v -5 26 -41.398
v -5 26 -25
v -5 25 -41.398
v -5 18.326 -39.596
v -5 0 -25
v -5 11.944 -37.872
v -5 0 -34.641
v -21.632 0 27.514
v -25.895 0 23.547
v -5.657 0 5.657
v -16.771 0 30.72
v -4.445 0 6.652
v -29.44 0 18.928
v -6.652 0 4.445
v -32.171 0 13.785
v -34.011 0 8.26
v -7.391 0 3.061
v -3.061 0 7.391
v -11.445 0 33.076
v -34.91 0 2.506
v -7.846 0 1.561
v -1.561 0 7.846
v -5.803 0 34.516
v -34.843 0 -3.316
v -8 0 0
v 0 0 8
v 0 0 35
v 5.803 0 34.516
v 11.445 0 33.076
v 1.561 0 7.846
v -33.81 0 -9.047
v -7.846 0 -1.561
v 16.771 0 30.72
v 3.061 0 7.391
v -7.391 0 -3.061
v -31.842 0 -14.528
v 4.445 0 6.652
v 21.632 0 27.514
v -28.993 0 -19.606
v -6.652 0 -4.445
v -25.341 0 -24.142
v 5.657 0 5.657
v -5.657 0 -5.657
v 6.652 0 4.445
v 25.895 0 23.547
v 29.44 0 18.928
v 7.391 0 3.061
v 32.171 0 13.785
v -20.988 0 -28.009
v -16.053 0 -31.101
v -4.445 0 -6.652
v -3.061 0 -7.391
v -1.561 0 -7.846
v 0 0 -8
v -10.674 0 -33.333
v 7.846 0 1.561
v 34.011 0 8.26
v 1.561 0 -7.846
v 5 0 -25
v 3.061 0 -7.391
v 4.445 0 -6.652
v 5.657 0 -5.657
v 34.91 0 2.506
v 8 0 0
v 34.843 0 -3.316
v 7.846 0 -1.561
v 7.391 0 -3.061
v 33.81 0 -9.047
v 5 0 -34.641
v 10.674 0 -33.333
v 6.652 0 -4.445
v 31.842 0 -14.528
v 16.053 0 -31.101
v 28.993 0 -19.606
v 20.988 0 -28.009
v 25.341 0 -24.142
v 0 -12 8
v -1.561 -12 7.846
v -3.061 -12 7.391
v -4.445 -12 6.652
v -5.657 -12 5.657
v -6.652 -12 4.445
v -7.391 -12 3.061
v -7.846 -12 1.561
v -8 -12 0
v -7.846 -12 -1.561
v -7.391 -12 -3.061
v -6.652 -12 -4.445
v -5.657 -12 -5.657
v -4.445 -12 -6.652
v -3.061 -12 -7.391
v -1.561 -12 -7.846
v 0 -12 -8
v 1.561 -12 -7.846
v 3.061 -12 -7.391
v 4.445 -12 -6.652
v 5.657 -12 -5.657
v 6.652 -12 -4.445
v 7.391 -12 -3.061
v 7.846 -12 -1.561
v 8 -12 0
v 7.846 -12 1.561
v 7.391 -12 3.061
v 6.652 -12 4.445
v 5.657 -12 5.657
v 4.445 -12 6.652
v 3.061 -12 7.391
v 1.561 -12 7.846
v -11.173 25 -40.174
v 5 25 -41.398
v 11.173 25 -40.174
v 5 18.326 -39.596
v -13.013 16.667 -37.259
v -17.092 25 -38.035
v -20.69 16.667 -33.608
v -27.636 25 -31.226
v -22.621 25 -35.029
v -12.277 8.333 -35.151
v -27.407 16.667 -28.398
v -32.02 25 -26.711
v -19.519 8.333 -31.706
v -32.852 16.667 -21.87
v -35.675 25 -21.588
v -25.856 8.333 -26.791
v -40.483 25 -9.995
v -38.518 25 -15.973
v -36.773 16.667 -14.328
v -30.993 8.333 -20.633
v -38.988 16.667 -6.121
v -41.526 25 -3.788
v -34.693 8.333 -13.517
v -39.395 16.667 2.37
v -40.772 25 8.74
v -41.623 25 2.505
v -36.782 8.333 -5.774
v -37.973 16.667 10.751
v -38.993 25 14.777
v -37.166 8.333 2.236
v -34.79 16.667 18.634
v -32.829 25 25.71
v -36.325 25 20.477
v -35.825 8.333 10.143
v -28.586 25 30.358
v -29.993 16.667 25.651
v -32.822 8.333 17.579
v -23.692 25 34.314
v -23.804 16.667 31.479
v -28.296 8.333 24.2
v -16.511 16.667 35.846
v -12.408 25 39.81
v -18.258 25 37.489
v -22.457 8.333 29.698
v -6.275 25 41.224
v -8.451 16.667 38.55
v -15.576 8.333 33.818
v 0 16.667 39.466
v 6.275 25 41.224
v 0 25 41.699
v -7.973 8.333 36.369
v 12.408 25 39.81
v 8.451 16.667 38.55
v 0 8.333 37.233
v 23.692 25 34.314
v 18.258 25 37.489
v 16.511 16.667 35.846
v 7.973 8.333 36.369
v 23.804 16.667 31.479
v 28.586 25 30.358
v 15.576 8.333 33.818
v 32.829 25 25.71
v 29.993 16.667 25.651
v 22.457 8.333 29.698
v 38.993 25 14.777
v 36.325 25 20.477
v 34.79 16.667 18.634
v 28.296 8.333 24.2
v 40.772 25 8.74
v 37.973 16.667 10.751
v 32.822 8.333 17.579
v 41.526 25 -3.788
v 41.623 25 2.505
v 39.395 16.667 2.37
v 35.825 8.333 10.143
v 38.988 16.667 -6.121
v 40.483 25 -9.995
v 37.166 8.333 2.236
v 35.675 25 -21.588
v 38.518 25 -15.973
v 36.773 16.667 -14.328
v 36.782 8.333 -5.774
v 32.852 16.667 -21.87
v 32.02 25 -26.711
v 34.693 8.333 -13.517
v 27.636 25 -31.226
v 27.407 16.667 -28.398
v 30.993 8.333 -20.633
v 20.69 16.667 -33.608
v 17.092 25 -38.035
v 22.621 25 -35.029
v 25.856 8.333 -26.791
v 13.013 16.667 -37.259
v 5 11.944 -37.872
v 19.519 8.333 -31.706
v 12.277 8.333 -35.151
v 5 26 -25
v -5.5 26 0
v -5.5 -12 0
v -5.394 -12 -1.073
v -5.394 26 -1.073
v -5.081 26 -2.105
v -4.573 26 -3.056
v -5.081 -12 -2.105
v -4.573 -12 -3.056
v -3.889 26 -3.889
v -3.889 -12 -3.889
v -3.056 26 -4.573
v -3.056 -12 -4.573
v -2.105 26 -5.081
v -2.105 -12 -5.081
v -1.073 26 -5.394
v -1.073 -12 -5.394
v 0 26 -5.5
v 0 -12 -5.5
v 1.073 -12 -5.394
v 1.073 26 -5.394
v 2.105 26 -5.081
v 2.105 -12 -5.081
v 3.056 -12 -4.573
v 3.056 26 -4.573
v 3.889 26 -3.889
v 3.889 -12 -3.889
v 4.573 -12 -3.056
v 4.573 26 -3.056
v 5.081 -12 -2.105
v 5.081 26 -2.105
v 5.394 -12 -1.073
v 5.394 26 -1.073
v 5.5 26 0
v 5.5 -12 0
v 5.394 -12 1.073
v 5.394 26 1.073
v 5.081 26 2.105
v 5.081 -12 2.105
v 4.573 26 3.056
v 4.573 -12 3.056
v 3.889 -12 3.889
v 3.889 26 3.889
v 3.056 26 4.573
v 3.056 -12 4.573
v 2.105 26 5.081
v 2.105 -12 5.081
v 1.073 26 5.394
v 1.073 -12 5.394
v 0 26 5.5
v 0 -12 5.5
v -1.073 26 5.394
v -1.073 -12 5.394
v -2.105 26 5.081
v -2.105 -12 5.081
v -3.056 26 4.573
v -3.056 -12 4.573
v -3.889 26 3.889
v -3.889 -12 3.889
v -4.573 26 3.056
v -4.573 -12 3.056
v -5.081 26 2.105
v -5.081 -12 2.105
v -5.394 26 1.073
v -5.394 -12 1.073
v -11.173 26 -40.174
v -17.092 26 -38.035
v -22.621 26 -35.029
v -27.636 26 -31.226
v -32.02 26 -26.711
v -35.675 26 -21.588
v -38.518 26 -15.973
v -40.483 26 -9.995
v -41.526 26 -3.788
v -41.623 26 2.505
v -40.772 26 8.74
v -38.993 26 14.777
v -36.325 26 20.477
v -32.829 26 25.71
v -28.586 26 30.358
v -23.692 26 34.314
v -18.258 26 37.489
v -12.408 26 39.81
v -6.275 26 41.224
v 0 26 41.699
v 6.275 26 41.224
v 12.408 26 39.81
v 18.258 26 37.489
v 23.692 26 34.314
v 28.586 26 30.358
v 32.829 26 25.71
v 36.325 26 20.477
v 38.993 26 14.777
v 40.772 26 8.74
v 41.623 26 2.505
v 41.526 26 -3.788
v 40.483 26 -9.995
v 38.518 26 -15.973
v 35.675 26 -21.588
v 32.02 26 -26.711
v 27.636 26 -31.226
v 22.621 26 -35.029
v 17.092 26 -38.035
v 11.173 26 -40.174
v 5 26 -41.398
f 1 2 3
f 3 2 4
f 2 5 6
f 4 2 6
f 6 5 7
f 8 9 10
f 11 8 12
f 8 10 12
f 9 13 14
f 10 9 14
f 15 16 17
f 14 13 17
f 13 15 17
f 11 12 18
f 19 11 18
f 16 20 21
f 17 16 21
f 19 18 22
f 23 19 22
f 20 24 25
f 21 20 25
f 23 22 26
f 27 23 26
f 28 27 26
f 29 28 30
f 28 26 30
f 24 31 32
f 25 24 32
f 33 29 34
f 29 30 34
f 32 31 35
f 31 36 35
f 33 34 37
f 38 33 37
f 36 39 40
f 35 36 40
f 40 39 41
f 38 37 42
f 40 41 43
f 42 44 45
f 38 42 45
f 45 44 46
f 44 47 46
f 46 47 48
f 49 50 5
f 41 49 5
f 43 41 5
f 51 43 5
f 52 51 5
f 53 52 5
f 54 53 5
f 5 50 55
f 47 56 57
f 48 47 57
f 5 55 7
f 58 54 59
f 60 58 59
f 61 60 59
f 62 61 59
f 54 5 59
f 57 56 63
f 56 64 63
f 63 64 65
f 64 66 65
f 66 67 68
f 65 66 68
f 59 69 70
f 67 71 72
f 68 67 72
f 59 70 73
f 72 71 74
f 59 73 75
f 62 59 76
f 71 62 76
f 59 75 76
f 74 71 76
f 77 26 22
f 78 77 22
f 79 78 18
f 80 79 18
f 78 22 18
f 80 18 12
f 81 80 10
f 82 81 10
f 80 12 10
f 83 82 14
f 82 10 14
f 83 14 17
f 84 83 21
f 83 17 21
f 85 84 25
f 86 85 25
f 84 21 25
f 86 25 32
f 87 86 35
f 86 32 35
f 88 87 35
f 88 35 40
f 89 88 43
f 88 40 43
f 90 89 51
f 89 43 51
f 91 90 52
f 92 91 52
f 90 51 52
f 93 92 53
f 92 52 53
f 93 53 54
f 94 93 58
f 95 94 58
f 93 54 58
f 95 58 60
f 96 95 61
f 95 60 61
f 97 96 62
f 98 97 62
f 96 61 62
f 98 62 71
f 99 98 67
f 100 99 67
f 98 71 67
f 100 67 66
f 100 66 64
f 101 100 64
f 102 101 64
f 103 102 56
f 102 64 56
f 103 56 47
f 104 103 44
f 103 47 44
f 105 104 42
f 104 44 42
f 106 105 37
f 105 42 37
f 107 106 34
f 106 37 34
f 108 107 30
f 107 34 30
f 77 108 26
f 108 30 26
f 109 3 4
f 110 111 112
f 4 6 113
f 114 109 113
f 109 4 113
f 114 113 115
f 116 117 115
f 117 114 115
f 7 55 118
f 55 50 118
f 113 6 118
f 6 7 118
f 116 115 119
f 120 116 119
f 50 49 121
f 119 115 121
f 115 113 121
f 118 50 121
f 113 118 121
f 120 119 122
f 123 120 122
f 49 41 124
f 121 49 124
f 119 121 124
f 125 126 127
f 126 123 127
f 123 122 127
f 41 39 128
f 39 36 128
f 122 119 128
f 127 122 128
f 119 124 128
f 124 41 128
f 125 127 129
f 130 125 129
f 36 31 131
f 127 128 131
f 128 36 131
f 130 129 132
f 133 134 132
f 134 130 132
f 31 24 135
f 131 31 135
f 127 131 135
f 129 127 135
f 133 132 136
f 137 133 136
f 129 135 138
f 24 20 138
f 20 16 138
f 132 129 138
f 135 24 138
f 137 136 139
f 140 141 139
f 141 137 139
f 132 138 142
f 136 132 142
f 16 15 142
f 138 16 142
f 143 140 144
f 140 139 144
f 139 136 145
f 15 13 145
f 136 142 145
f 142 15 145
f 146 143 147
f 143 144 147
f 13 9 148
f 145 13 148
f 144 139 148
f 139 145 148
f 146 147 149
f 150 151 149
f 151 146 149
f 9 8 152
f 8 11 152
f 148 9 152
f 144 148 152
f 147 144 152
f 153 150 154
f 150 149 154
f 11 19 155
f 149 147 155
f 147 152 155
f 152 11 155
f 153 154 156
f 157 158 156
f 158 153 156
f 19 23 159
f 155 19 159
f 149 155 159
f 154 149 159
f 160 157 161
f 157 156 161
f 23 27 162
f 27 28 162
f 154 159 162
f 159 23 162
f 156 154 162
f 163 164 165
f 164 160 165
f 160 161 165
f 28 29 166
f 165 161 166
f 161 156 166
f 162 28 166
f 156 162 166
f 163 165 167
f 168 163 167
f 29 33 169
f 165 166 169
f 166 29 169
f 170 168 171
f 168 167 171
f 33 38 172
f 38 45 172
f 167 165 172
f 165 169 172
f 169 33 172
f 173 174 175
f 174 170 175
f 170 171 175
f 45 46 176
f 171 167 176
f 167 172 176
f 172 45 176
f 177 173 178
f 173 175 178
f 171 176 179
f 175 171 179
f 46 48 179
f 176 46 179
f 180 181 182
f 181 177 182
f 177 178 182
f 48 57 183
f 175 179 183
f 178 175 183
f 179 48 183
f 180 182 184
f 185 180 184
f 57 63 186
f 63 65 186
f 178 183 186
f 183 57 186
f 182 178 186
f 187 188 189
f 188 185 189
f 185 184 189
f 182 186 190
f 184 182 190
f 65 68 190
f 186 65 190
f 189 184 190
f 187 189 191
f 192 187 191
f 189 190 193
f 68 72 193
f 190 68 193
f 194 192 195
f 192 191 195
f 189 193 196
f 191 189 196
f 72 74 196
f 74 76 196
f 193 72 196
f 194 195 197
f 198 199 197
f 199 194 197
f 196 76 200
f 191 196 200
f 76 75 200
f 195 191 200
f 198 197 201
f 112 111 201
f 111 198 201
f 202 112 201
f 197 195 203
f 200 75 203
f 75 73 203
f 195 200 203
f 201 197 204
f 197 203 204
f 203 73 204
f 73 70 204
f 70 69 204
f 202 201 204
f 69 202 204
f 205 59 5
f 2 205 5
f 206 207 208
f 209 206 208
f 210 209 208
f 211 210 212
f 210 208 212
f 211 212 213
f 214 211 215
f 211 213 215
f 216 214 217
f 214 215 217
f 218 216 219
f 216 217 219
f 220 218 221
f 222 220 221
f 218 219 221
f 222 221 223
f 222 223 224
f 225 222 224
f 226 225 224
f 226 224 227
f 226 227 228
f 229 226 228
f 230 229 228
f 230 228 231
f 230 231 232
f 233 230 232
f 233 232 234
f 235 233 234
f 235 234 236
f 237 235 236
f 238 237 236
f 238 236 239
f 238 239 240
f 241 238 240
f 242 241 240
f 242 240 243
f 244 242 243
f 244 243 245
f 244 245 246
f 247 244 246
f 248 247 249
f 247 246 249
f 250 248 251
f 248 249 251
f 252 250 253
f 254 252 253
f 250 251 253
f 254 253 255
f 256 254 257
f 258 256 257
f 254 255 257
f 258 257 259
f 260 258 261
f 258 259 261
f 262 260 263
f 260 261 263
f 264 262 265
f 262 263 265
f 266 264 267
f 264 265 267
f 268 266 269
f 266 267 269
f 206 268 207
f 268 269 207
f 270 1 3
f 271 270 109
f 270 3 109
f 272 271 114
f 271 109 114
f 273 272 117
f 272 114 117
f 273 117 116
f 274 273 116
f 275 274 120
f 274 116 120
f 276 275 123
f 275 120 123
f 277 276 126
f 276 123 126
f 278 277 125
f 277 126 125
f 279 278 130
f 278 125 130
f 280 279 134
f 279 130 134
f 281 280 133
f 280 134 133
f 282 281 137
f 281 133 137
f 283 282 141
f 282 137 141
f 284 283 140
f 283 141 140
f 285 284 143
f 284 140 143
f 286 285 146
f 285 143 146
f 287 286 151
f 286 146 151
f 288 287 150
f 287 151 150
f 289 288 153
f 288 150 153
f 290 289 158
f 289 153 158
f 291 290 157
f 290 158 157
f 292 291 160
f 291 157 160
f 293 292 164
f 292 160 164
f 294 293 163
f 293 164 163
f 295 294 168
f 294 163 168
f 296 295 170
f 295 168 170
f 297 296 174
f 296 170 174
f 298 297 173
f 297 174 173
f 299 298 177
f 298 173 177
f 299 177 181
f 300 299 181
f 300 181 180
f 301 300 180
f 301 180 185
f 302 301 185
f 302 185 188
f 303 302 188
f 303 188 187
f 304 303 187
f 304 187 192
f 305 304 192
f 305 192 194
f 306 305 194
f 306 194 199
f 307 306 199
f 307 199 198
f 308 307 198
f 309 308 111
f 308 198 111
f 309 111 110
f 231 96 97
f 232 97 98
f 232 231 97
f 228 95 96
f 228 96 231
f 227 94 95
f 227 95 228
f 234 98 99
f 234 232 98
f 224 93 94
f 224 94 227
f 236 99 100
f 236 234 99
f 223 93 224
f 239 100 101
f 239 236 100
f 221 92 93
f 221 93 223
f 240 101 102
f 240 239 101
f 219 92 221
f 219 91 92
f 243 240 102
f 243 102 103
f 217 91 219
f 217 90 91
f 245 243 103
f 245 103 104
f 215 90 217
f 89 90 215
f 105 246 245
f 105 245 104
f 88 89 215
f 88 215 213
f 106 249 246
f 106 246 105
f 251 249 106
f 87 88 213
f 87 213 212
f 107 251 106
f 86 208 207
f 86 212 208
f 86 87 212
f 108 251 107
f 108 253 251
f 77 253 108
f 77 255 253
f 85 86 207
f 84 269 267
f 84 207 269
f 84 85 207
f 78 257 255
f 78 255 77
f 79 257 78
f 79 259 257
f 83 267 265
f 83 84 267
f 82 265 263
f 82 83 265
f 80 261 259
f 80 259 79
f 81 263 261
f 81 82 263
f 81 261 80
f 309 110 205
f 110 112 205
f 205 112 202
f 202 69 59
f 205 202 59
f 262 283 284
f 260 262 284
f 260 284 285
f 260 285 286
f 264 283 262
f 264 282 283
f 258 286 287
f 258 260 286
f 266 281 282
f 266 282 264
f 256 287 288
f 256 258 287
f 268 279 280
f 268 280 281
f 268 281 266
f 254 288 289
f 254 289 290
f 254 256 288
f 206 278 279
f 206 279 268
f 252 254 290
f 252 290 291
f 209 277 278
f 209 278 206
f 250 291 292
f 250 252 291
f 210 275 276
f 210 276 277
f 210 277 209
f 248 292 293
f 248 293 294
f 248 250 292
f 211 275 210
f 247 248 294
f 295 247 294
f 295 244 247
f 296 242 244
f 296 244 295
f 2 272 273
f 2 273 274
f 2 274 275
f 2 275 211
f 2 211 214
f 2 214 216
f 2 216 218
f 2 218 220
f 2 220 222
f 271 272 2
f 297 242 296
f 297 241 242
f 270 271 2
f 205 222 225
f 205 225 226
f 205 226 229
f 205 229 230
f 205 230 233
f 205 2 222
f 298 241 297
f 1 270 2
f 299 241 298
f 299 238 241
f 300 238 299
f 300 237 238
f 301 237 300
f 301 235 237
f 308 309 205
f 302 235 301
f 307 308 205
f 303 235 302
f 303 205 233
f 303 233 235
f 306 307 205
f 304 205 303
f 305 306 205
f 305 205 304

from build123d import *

# Parameters (mm, degrees)
SKETCH1_R                  = 35
EXTRUDE1_DEPTH             = 25
EXTRUDE1_DRAFT             = -15
SKETCH2_R                  = 8
EXTRUDE2_DEPTH             = 12
SKETCH3_W                  = 10
SKETCH3_H                  = 30
CUT_EXTRUDE1_DEPTH         = 70.617297676
EXTRUDE4_DEPTH             = 1
F_11_0_11_DIAMETER_HOLE1_D = 11


with BuildPart() as part:
    # Sketch1 → Extrude1 (with draft: the straight prism first)
    with BuildSketch(Plane(origin=(0, 0, 0), x_dir=(1, 0, 0), z_dir=(0, 1, 0))):
        Circle(SKETCH1_R)
    extrude(amount=EXTRUDE1_DEPTH)
    # Extrude1: the draft: its side faces are tilted about the plane it starts from
    extrude1_sides = [part.faces().sort_by_distance(p)[0] for p in [
        (-35, 12.5, 0),
    ]]
    draft(extrude1_sides, Plane(origin=(0, 0, 0), x_dir=(1, 0, 0), z_dir=(0, 1, 0)), EXTRUDE1_DRAFT)

    # Sketch2 → Extrude2 (add)
    with BuildSketch(Plane.XZ):
        with Locations(Location((0, 0, 0), (0, 0, 90))):
            Circle(SKETCH2_R)
    extrude(amount=EXTRUDE2_DEPTH)

    # Sketch3 → Cut-Extrude1 (cut, through all)
    with BuildSketch(Plane(origin=(0, 25, 0), x_dir=(1, 0, 0), z_dir=(0, 1, 0))):
        with Locations((0, 40)):
            Rectangle(SKETCH3_W, SKETCH3_H)
    extrude(amount=-CUT_EXTRUDE1_DEPTH, mode=Mode.SUBTRACT)

    # Sketch5 → Extrude4 (add)
    with BuildSketch(Plane(origin=(0, 25, 0), x_dir=(1, 0, 0), z_dir=(0, 1, 0))):
        with BuildLine():
            Line((-5, 25), (-5, 41.397875161))
            ThreePointArc((-5, 41.397875161), (0, -41.698729811), (5, 41.397875161))
            Line((5, 41.397875161), (5, 25))
            Line((5, 25), (-5, 25))
        make_face()
    extrude(amount=EXTRUDE4_DEPTH)

    # Ø11.0 (11) Diameter Hole1 (through all)
    with Locations(Plane(origin=(0, 26, 0), x_dir=(1, 0, 0), z_dir=(0, 1, 0))):
        with Locations((0, 0)):
            Hole(F_11_0_11_DIAMETER_HOLE1_D / 2)


solid = part.part
